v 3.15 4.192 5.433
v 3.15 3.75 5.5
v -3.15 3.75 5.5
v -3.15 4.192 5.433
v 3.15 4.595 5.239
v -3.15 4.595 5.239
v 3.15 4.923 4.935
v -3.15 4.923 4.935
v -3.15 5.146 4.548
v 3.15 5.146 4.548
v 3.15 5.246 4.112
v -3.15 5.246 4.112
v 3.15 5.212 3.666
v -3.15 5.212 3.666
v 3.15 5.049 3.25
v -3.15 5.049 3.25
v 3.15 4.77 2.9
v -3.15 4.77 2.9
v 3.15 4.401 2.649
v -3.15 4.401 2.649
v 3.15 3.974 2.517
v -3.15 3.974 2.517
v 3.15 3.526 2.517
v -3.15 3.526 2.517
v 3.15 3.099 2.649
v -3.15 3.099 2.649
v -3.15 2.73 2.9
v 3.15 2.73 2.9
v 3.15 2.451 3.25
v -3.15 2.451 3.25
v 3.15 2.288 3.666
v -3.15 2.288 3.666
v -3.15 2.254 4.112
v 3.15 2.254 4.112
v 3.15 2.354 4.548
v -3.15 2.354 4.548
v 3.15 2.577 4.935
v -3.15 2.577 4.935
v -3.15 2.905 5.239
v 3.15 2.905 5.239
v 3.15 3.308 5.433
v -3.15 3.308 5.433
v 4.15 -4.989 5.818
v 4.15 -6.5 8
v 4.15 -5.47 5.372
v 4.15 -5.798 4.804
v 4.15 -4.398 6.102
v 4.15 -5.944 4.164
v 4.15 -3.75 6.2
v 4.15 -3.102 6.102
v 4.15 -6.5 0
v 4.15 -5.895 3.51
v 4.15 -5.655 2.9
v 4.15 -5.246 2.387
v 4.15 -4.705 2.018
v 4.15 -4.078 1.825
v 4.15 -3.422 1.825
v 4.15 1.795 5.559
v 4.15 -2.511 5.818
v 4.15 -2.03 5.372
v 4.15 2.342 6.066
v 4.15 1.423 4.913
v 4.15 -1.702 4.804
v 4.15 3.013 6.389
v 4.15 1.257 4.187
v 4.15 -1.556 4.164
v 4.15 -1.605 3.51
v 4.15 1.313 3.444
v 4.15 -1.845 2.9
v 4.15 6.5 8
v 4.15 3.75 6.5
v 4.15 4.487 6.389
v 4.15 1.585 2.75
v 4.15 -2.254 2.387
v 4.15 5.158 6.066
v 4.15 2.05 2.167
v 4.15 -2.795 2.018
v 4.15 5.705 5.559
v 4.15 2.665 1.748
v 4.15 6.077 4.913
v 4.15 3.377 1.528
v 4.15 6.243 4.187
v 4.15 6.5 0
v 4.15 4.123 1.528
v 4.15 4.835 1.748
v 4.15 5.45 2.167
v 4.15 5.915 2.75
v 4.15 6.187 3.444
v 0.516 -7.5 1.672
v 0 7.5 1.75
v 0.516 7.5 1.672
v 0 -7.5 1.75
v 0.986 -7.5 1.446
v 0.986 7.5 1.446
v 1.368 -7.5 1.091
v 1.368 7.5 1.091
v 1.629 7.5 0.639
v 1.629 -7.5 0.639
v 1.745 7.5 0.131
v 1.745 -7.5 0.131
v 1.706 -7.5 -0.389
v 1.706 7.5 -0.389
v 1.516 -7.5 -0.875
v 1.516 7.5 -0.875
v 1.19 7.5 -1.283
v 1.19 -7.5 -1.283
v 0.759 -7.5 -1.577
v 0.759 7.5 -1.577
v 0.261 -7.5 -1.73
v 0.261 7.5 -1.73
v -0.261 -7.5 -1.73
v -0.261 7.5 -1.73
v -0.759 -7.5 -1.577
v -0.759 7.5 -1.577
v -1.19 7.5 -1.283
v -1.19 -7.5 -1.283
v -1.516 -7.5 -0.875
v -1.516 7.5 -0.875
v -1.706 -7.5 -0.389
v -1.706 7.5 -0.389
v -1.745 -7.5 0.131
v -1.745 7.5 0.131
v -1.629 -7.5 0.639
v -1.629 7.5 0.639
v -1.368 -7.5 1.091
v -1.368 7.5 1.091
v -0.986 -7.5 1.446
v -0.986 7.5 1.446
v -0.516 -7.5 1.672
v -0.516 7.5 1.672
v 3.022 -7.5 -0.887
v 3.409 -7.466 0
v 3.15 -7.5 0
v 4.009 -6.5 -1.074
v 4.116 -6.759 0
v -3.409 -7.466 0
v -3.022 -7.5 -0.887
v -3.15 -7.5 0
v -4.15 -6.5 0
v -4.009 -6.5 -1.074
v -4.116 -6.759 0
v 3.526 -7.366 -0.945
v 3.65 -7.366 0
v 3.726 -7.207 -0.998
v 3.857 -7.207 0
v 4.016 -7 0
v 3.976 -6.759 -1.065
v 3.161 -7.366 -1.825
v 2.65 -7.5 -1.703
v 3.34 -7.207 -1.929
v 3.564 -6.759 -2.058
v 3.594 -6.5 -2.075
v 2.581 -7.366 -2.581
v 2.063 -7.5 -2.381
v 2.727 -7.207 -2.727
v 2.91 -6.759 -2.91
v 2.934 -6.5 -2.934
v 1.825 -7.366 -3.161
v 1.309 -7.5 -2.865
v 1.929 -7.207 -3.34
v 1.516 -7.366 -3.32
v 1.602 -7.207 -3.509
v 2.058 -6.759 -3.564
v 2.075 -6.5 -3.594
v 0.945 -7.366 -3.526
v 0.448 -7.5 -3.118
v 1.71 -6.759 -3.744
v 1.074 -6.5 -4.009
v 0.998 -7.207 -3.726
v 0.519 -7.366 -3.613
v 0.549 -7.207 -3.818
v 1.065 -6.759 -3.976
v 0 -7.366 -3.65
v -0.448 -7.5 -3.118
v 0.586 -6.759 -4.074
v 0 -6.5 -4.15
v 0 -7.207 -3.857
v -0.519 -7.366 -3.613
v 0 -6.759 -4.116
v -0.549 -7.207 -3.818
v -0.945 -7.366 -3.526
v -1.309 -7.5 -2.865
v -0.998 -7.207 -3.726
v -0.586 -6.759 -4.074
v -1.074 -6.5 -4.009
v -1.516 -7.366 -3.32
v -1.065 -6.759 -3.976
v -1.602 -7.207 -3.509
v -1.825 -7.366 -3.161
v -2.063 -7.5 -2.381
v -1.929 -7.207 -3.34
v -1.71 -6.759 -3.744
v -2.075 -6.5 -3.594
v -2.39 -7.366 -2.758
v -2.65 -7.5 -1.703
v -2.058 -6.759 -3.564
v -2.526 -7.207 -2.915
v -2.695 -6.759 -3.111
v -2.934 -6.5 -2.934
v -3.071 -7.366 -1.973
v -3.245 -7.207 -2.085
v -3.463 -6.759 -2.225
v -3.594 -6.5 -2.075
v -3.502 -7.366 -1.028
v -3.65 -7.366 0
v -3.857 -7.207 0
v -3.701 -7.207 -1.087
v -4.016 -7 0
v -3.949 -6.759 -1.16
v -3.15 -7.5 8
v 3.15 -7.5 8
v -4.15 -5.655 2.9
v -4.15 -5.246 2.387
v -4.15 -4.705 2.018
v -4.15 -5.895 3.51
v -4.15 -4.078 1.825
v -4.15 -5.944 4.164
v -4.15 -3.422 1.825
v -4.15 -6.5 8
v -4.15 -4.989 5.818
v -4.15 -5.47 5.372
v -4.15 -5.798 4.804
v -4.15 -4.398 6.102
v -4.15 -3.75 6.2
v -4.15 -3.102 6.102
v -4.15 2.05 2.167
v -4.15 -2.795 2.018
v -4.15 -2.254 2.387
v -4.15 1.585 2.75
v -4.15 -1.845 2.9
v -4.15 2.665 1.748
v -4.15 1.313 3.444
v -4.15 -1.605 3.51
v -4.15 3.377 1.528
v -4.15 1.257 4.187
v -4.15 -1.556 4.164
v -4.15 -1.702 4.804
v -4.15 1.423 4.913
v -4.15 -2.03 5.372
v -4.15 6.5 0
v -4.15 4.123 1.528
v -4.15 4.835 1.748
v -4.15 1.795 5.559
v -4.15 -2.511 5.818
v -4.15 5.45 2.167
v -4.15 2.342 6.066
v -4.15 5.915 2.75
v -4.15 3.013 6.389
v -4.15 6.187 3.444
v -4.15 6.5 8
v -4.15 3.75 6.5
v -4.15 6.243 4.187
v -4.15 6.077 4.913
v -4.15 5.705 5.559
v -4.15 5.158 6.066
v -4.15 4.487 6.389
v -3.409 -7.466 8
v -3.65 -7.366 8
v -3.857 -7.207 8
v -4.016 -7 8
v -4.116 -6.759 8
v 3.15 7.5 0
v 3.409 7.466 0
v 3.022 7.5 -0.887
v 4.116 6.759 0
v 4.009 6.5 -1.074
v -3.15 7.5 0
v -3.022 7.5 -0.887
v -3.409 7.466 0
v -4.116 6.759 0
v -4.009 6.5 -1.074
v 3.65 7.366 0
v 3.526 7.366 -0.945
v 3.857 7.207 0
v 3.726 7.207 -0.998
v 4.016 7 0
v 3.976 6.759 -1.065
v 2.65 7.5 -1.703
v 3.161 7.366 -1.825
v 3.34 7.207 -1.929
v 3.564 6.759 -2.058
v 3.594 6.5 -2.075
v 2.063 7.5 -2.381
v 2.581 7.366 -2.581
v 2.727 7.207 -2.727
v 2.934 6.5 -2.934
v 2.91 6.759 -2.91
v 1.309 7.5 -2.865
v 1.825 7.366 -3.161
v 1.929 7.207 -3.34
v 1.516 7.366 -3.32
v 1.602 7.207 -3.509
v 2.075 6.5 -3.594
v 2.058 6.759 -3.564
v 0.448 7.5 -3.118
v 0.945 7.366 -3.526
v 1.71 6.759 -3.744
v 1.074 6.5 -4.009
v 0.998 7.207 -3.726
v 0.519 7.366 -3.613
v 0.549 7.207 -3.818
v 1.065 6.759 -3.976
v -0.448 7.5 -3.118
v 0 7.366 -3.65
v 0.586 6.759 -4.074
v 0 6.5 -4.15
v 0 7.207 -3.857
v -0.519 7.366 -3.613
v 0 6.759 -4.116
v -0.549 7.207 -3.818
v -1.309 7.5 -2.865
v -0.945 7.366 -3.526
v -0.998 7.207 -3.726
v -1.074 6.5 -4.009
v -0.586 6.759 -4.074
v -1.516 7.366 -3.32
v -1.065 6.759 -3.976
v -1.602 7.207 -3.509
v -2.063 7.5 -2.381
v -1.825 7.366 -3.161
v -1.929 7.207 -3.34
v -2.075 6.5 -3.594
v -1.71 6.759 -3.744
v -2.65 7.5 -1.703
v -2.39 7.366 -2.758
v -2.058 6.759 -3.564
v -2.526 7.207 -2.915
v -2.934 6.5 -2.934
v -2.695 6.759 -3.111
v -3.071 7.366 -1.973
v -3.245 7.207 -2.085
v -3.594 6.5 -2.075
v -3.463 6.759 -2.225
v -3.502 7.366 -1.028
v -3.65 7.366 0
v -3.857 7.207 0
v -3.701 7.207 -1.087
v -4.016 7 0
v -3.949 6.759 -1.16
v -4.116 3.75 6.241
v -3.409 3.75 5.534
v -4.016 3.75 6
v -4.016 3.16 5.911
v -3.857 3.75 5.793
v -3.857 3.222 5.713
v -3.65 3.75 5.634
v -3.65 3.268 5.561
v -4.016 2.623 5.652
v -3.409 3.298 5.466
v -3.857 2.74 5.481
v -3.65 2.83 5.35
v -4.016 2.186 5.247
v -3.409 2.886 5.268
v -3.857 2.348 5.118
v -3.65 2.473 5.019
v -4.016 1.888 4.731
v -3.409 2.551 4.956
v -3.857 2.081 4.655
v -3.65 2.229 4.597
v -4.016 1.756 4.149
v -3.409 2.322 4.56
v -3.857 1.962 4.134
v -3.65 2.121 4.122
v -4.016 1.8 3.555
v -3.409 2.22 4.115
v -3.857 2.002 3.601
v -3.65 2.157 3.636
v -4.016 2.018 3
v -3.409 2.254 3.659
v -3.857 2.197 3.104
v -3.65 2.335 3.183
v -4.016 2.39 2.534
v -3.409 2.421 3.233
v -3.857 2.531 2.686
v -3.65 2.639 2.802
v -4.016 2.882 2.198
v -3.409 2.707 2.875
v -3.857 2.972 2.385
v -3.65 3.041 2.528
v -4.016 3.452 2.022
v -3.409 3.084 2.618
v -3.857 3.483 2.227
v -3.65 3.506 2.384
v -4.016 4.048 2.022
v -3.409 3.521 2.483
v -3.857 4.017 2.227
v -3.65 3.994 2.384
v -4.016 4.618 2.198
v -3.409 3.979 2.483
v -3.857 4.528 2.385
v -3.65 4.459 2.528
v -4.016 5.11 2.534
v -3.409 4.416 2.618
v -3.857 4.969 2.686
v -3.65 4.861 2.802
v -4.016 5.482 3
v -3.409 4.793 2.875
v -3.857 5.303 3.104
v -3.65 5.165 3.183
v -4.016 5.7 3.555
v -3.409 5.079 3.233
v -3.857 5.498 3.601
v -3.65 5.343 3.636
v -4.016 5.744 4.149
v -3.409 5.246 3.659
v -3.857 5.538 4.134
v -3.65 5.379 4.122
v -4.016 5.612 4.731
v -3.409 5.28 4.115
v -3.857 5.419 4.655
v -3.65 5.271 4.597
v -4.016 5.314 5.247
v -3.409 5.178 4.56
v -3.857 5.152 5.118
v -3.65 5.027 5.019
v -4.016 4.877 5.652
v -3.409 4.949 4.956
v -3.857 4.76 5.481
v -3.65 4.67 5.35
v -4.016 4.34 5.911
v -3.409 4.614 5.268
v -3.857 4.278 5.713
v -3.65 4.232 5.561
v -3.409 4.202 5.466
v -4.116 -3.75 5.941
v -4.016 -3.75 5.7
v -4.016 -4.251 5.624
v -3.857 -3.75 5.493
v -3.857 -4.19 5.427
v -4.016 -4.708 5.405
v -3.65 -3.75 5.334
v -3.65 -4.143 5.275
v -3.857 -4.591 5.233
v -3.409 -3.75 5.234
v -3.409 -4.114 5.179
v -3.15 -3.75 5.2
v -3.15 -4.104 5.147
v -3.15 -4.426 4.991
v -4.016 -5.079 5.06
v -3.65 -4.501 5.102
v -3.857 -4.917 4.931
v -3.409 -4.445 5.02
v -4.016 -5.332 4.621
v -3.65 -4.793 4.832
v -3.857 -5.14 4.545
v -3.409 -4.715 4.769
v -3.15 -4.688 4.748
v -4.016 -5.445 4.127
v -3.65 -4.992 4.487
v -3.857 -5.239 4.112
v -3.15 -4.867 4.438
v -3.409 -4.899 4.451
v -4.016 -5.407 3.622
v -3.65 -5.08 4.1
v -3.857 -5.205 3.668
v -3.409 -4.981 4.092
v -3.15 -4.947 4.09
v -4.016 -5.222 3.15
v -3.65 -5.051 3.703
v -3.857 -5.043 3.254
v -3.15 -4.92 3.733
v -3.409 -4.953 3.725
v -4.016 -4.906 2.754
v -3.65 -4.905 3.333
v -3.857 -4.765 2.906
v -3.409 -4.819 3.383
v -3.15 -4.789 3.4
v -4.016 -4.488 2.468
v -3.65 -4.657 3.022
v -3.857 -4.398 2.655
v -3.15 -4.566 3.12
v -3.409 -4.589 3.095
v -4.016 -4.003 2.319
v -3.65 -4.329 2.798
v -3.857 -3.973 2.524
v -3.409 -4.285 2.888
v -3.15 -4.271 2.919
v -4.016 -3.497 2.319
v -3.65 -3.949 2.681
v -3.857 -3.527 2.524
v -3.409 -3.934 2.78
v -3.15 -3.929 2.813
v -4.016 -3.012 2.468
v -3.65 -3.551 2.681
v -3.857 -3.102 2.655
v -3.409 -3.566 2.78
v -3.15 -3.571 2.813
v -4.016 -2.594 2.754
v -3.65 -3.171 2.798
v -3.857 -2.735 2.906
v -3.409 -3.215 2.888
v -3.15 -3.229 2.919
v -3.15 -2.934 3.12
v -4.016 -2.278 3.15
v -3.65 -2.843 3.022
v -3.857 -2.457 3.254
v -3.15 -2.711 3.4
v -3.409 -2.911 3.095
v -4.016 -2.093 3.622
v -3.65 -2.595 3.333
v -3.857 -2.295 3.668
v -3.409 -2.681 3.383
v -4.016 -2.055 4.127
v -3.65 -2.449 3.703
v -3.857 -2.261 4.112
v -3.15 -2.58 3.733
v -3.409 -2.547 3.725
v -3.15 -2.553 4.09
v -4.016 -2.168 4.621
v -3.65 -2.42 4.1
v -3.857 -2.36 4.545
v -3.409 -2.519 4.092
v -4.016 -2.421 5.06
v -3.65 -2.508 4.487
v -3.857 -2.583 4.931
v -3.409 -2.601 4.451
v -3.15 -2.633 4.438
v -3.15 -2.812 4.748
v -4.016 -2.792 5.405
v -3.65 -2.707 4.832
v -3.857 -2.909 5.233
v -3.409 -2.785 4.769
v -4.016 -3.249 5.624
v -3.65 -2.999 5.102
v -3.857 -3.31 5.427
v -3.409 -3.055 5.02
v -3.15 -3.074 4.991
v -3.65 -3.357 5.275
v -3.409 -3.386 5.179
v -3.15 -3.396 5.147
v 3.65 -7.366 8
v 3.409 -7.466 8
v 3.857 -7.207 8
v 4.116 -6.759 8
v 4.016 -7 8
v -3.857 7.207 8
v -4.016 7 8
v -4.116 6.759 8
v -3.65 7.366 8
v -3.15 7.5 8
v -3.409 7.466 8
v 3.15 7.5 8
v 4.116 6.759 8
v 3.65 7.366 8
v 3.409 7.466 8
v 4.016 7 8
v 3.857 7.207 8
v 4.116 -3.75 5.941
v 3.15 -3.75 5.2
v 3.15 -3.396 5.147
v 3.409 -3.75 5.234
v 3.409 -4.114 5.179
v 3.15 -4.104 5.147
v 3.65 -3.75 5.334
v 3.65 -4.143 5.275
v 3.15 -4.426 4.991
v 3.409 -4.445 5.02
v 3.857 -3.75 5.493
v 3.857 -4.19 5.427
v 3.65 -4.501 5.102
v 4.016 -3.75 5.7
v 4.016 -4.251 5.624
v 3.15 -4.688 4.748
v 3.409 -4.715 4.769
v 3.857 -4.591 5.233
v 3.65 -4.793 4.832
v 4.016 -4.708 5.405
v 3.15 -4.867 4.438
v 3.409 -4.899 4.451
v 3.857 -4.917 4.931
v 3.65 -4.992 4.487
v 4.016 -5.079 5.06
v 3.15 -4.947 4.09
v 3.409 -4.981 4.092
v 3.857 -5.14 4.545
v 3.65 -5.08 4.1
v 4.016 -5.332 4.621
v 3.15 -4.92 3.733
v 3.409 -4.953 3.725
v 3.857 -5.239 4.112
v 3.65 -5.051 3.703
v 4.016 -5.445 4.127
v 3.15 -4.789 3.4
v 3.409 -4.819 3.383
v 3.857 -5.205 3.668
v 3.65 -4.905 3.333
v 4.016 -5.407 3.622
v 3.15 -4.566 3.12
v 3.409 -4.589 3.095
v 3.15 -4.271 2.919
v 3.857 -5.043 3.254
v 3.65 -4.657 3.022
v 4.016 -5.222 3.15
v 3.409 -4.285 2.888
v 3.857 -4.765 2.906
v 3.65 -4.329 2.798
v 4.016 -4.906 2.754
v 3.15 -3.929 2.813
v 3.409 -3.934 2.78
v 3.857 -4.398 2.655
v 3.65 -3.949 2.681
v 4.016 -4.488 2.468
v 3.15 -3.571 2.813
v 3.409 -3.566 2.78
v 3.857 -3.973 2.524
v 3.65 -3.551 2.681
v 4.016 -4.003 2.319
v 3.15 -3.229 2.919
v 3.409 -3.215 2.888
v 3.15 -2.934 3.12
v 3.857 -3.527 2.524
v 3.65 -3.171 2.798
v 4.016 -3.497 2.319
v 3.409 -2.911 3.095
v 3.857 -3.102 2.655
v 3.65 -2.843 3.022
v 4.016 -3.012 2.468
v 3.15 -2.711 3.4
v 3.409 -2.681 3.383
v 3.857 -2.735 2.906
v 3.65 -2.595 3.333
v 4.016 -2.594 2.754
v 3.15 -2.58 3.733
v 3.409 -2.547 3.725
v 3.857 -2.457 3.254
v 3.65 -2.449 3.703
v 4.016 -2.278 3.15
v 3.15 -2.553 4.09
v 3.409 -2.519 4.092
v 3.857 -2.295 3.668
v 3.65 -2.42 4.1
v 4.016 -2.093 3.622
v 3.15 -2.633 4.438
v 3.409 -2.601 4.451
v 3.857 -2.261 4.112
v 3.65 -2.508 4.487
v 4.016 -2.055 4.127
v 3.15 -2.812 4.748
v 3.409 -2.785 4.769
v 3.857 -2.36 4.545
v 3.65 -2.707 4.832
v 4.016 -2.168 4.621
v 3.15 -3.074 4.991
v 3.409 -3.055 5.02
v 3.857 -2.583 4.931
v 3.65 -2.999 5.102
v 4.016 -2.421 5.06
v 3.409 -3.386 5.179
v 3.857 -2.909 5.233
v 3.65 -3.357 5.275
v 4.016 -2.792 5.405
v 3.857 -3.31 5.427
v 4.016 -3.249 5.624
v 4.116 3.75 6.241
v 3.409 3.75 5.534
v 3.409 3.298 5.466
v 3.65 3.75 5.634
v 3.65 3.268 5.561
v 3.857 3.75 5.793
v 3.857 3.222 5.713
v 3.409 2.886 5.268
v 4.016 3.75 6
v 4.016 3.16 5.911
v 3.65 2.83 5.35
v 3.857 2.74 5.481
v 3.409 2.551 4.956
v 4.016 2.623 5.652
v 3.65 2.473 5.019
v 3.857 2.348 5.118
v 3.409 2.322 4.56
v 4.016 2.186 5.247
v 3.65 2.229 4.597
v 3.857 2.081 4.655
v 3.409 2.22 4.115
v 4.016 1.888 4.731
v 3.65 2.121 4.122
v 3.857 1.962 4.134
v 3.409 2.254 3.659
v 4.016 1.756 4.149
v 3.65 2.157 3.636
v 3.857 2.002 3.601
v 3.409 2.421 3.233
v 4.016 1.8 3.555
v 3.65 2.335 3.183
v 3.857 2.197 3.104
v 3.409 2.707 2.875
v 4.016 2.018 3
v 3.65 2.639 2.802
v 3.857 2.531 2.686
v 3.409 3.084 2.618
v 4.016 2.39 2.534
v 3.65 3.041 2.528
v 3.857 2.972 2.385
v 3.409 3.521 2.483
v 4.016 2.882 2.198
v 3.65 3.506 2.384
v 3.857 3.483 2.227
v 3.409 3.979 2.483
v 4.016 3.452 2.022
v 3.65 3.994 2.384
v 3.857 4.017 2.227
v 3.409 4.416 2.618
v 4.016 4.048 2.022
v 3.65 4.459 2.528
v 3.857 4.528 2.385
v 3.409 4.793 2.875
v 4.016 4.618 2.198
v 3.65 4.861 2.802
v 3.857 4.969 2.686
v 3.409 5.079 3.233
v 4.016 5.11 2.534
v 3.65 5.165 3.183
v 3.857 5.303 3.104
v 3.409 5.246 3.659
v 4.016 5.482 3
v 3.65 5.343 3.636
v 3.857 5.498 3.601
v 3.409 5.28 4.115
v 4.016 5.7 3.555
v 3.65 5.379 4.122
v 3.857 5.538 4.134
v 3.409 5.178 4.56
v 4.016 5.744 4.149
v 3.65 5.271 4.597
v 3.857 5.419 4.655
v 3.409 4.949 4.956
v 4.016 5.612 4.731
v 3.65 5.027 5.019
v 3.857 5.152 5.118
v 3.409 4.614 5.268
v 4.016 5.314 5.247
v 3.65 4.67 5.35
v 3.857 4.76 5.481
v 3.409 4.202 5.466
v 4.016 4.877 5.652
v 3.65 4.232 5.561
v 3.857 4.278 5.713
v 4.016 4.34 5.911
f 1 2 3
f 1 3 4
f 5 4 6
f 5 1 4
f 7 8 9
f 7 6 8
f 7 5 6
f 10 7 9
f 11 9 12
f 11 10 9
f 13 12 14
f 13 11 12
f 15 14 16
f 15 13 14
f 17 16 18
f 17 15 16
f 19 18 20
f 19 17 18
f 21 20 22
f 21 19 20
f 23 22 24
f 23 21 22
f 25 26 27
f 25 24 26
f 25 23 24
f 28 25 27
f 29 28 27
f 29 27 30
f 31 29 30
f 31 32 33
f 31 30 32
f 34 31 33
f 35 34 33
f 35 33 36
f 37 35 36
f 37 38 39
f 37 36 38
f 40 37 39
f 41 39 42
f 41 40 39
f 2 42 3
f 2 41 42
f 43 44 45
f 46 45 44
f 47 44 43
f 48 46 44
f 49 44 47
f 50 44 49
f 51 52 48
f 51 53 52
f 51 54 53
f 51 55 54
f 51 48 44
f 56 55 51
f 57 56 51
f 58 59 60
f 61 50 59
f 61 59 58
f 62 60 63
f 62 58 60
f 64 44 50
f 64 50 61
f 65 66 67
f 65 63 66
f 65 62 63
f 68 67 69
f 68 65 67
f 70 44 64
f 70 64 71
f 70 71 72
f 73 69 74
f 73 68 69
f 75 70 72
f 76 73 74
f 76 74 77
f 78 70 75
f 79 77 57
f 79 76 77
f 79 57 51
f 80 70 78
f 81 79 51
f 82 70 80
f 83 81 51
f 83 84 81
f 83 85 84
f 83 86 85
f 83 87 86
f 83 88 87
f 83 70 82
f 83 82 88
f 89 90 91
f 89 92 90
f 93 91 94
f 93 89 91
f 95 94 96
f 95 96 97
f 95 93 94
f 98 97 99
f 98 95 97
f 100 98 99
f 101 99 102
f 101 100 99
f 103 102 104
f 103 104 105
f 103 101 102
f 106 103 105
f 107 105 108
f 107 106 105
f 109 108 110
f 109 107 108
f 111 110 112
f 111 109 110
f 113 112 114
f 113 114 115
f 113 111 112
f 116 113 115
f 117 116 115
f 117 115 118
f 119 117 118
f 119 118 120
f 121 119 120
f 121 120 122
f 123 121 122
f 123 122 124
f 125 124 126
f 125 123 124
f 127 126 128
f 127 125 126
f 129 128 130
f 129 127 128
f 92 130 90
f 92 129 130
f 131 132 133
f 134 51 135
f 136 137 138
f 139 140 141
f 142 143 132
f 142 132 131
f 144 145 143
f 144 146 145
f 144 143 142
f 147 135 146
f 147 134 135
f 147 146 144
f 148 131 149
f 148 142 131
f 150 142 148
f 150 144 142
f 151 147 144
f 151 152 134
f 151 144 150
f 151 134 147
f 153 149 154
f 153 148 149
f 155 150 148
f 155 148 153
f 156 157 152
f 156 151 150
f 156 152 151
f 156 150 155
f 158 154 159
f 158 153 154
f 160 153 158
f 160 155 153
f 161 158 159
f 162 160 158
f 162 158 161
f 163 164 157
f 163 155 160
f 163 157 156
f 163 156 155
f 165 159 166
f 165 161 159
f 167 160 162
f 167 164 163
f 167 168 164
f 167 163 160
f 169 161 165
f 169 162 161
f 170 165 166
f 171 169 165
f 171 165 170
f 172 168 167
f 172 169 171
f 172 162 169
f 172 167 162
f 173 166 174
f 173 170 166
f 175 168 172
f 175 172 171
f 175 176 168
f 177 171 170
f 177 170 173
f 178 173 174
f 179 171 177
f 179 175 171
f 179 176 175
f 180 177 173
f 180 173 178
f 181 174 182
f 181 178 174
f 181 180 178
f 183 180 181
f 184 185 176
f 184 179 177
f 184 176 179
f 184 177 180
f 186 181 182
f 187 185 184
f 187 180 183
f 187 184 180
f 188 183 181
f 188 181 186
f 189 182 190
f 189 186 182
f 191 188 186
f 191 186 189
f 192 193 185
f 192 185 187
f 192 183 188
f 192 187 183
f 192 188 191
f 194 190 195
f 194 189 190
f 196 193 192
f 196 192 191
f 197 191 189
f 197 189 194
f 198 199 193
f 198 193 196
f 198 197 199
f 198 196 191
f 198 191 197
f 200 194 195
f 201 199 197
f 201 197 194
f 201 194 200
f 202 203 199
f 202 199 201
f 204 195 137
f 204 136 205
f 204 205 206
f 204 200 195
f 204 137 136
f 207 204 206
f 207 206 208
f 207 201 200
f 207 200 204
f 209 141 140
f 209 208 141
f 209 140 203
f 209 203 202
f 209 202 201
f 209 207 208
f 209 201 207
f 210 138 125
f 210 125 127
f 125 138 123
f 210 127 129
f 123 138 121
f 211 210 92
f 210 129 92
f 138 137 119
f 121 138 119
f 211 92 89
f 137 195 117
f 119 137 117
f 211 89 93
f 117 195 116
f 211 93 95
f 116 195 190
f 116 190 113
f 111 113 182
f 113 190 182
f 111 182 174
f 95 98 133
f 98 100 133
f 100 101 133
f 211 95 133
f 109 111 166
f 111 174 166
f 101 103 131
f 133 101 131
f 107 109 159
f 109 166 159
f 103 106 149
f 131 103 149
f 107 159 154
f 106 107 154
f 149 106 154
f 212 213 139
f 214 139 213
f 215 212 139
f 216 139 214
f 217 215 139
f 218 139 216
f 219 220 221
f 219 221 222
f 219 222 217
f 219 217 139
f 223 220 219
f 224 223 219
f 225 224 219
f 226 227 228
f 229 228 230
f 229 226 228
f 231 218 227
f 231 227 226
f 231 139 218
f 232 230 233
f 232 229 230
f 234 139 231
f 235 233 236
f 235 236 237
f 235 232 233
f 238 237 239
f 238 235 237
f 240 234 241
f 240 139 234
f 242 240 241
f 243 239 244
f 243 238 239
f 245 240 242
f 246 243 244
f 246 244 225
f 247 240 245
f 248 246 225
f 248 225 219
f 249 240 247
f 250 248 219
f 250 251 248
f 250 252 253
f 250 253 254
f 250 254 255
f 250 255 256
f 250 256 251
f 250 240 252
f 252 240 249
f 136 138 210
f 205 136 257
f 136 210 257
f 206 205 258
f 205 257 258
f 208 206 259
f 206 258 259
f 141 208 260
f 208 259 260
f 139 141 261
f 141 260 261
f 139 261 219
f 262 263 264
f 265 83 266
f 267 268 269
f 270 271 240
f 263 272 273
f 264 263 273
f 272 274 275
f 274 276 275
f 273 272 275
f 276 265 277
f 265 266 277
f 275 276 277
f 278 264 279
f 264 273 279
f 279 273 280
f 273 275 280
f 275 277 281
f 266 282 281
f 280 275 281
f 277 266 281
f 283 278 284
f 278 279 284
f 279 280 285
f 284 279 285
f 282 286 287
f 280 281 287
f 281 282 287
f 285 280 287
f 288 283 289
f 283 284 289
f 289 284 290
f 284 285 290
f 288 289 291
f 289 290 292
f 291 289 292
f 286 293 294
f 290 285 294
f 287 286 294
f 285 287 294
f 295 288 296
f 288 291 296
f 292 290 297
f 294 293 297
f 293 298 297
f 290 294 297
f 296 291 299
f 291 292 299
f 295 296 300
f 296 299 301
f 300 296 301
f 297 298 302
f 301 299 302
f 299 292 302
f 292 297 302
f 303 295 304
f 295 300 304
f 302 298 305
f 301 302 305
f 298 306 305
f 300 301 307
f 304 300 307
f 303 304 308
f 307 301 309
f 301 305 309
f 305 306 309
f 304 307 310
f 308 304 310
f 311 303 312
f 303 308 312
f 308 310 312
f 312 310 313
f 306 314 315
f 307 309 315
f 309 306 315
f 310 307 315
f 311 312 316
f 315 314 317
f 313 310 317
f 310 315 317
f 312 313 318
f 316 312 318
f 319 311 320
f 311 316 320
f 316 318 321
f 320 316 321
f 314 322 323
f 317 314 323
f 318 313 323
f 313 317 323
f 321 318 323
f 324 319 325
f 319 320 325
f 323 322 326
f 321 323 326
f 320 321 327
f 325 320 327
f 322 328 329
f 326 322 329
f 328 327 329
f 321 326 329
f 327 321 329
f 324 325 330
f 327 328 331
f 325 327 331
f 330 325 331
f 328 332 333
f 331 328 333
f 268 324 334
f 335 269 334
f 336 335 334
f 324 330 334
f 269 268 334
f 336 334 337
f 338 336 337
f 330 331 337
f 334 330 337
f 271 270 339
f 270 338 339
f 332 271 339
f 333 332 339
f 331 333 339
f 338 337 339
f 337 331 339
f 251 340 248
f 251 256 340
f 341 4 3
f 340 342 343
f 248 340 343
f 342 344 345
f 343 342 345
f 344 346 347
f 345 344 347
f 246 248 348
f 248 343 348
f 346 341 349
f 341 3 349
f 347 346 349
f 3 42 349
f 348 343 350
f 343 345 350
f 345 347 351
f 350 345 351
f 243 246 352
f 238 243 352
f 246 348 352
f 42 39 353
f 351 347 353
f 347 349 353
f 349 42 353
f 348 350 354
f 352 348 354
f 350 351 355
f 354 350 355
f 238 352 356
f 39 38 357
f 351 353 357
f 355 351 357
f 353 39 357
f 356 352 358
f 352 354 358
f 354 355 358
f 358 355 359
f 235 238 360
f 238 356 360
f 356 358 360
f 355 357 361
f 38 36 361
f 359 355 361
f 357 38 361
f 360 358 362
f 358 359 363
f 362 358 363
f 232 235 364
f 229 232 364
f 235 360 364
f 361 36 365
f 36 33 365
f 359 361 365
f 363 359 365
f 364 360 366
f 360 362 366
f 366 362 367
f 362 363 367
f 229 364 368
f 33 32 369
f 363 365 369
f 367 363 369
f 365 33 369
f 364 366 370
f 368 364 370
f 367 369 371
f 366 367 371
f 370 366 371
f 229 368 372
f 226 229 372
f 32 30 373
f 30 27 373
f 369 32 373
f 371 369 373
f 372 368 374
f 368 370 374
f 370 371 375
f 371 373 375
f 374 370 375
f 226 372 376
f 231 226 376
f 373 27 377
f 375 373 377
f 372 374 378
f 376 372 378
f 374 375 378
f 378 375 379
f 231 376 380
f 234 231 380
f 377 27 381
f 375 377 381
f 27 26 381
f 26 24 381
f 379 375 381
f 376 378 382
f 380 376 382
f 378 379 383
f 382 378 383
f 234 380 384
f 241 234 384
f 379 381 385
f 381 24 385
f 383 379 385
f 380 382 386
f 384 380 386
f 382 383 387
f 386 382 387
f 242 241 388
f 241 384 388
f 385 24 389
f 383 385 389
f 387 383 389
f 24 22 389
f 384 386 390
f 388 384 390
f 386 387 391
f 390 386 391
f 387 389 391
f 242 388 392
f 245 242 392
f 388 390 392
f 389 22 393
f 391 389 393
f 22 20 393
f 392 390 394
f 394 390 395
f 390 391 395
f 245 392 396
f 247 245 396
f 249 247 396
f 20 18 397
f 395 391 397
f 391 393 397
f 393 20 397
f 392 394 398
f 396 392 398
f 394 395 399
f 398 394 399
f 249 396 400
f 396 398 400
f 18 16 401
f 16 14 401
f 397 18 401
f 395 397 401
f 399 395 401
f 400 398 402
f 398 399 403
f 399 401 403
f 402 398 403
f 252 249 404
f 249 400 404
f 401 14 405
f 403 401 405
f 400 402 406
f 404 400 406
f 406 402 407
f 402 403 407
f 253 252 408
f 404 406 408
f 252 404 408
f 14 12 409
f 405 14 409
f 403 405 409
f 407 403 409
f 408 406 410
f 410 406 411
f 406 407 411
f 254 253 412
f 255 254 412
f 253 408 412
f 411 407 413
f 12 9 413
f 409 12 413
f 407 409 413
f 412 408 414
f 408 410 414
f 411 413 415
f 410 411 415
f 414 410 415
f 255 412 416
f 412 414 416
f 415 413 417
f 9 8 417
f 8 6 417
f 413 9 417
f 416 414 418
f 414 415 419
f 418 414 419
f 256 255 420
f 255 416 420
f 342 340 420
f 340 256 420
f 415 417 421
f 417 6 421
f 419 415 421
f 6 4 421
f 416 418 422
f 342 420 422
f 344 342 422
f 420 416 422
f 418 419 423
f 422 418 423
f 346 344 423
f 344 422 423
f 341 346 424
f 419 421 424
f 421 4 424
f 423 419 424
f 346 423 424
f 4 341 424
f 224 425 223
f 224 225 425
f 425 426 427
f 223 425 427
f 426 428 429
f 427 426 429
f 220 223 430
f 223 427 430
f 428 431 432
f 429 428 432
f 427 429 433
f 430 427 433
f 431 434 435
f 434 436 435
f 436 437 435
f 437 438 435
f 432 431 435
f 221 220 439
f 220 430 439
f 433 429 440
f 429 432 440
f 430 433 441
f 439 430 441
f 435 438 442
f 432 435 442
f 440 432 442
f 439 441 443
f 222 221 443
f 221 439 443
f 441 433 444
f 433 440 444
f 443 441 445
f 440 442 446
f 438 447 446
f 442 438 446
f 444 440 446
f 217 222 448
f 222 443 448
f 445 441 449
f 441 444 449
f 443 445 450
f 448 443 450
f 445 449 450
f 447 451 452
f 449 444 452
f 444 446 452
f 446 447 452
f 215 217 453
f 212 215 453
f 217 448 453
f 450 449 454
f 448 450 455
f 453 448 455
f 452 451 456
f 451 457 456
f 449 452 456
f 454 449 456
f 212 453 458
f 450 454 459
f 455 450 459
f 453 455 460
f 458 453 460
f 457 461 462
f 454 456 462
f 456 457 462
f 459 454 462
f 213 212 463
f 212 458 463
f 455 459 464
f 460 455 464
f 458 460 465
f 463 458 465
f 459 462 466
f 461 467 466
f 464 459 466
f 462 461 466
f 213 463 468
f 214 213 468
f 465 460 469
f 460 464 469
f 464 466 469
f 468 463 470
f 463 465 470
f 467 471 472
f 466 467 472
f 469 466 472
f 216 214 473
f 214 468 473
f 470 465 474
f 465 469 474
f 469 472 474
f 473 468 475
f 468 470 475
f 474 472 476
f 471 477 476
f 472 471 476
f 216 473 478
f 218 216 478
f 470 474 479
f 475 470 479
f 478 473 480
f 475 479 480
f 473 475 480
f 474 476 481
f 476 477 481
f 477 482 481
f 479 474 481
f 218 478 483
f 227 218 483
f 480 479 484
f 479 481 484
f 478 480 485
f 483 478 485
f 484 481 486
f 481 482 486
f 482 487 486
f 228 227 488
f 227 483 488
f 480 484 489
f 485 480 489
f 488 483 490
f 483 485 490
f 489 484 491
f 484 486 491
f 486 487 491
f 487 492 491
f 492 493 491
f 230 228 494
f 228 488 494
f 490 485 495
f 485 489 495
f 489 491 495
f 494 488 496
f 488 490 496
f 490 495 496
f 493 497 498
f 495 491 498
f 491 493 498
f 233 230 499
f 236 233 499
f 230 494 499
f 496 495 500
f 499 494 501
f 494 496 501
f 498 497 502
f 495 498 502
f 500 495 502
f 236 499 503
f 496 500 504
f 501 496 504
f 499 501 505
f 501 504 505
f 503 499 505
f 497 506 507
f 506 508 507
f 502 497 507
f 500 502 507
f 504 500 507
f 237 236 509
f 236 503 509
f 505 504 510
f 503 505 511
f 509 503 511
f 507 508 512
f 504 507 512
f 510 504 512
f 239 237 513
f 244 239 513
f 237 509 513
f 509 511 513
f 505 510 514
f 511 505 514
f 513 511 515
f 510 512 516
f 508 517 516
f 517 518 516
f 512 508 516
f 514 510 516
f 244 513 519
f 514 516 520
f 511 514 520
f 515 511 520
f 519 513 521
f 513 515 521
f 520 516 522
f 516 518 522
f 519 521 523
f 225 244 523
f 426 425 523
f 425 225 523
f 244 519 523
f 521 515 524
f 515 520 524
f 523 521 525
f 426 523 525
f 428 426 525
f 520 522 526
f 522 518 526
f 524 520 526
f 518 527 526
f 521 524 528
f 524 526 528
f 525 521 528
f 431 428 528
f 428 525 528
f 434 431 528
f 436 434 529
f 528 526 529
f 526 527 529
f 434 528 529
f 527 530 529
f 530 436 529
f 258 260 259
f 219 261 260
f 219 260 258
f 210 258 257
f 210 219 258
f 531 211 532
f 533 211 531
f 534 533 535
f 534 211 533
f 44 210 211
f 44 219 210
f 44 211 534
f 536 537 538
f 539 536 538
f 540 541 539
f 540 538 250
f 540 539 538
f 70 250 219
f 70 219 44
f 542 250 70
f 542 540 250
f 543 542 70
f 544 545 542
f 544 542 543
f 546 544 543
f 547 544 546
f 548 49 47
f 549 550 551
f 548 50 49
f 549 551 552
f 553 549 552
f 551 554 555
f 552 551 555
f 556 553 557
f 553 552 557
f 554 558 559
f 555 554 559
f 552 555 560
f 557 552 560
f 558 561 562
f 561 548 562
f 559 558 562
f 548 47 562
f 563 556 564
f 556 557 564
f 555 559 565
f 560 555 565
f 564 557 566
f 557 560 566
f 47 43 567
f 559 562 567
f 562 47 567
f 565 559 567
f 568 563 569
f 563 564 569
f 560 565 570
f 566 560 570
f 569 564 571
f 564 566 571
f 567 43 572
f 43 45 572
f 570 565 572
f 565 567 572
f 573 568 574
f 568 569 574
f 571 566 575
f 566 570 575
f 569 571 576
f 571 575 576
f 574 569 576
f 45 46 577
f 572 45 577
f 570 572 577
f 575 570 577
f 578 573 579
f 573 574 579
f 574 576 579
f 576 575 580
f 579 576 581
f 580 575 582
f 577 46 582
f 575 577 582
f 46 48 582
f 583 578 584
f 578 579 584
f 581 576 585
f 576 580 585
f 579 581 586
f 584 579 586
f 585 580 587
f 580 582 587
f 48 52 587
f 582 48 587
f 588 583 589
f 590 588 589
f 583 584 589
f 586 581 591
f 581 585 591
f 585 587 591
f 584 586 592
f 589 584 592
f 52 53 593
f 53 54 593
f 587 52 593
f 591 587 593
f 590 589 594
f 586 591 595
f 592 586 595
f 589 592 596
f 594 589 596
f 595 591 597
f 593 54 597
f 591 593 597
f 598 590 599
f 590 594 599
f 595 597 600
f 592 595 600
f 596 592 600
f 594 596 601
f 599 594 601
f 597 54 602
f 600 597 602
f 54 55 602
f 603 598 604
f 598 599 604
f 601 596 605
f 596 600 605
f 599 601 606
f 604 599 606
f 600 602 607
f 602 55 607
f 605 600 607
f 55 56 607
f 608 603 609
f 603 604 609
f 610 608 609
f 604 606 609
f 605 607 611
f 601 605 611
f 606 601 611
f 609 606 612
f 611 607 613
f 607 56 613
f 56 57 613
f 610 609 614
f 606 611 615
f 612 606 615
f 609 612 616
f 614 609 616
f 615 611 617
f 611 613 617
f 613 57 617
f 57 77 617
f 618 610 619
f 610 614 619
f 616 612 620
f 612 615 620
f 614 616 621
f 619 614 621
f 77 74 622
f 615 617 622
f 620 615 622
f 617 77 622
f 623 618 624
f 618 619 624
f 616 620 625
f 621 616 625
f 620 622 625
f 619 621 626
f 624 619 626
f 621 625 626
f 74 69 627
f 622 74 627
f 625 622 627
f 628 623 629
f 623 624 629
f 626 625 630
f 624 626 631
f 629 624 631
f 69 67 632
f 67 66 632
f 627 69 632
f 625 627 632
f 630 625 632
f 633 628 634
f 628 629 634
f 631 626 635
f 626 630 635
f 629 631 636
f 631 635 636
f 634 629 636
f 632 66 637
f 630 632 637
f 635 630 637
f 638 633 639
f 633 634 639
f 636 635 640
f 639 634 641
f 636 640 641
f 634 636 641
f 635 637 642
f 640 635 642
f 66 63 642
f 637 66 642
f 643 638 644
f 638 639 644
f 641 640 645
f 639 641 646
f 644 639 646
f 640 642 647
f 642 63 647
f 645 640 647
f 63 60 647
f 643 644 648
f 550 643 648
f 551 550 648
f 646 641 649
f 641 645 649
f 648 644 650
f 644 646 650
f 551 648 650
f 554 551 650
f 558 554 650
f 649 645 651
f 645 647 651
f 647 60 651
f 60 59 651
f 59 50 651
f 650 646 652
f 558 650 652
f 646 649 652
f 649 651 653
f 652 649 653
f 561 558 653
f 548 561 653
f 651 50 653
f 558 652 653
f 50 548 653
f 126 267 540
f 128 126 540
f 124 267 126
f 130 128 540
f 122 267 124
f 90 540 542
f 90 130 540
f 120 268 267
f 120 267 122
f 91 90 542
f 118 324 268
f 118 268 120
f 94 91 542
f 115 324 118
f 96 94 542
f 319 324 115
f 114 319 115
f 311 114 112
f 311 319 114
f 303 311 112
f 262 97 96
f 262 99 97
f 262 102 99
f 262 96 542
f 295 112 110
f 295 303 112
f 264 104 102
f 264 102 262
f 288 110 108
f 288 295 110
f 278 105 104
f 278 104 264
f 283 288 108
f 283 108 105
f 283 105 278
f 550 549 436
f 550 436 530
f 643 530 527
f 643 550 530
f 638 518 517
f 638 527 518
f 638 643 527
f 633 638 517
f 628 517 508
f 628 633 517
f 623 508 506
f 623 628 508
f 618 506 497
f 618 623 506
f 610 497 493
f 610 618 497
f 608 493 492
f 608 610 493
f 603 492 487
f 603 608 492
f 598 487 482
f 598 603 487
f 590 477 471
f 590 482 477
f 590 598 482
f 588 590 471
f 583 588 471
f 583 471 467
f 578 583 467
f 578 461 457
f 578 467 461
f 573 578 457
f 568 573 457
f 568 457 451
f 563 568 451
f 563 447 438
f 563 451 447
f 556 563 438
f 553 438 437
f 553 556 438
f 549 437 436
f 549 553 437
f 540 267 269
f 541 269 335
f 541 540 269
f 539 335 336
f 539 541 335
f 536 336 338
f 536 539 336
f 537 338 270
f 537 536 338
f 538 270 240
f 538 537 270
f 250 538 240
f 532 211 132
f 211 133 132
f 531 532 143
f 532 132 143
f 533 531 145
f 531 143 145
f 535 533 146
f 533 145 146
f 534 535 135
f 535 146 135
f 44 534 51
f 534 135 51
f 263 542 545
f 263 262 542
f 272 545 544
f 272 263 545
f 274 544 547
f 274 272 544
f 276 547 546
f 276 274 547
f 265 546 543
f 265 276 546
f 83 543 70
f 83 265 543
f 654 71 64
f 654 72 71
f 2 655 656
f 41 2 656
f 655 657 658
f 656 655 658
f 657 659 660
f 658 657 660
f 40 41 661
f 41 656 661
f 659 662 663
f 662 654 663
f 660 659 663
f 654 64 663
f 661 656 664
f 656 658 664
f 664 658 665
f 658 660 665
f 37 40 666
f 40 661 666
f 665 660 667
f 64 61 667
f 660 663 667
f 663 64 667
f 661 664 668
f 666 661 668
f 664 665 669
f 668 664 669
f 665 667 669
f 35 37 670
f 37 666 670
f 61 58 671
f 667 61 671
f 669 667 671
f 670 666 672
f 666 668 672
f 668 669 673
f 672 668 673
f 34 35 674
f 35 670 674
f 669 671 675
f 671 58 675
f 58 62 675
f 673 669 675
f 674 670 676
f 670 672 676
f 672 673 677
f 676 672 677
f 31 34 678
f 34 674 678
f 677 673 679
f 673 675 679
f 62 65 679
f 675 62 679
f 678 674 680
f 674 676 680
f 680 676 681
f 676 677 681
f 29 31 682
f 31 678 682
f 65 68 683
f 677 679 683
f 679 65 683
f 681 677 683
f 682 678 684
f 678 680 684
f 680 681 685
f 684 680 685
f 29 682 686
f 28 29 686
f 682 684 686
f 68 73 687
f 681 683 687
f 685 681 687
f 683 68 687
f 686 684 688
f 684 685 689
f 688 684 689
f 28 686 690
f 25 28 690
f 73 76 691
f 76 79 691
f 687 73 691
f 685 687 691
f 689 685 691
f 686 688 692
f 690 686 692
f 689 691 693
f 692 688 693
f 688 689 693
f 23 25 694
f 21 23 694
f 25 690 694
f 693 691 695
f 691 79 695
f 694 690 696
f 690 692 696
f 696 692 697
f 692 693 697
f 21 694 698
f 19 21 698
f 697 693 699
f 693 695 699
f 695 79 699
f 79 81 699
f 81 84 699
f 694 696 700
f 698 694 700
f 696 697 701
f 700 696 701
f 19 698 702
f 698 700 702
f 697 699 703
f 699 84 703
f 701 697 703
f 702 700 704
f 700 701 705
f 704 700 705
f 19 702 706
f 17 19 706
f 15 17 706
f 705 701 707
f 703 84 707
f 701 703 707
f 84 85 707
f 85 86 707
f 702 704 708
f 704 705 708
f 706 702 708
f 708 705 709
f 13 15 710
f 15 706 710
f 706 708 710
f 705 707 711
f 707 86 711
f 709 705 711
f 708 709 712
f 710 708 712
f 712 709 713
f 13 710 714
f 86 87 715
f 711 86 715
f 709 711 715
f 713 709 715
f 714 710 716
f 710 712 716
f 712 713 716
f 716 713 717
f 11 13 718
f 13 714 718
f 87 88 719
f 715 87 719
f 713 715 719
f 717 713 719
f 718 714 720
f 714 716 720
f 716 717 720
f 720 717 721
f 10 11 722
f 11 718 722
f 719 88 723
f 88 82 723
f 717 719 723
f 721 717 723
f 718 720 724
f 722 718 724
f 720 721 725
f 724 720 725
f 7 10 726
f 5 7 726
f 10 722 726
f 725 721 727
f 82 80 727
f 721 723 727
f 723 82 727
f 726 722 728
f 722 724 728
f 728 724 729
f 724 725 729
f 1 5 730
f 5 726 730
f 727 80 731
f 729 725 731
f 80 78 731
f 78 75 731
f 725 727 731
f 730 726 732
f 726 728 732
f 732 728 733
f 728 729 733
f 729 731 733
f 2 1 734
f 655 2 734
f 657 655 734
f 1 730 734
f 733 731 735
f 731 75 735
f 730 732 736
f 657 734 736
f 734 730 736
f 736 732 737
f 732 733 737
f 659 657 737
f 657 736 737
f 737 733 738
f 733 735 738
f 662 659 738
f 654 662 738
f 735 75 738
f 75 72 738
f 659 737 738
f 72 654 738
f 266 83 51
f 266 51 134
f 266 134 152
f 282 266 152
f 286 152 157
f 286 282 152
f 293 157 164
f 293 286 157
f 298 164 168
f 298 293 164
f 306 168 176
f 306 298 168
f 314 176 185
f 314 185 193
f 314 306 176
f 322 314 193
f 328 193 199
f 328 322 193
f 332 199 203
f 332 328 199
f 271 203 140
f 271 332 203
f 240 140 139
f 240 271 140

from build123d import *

# Parameters (mm, degrees)
SKETCH2_R               = 1.75
BOSS_EXTRUDE1_DEPTH     = 7.5
CUT_EXTRUDE1_DEPTH      = 14.752817893
CUT_EXTRUDE1_DEPTH_BACK = 14.752817893
SKETCH3_R               = 1.2
SKETCH3_R_2             = 1.5
FILLET1_R               = 1
FILLET2_R               = 1


with BuildPart() as part:
    # Sketch2 → Boss-Extrude1 (new, symmetric)
    with BuildSketch(Plane(origin=(0, 0, 0), x_dir=(1, 0, 0), z_dir=(0, 1, 0))):
        with BuildLine():
            Line((-4.15, 0), (-4.15, -8))
            Line((-4.15, -8), (4.15, -8))
            Line((4.15, -8), (4.15, 0))
            ThreePointArc((4.15, 0), (0, 4.15), (-4.15, 0))
        make_face()
        with Locations(Location((0, 0, 0), (0, 0, 270))):
            Circle(SKETCH2_R, mode=Mode.SUBTRACT)
    extrude(amount=BOSS_EXTRUDE1_DEPTH, both=True)

    # Sketch3 → Cut-Extrude1 (cut, two sides: drawn at the far end of the back side and taken through both)
    with BuildSketch(Plane.ZY.offset(4.15).offset(-CUT_EXTRUDE1_DEPTH_BACK)):
        with Locations((4, -3.75)):
            Circle(SKETCH3_R)
        with Locations((4, 3.75)):
            Circle(SKETCH3_R_2)
    extrude(amount=CUT_EXTRUDE1_DEPTH + CUT_EXTRUDE1_DEPTH_BACK, mode=Mode.SUBTRACT)

    # Fillet1
    fillet1_edges = [part.edges().sort_by_distance(p)[0] for p in [
        (4.15, -3.75, 2.8),
        (-4.15, -3.75, 2.8),
        (4.15, 3.75, 2.5),
        (-4.15, 3.75, 2.5),
    ]]
    fillet(fillet1_edges, radius=FILLET1_R)

    # Fillet2
    fillet2_edges = [part.edges().sort_by_distance(p)[0] for p in [
        (4.15, 7.5, 4),
        (0, 7.5, -4.15),
        (4.15, -7.5, 4),
        (-4.15, -7.5, 4),
        (0, -7.5, -4.15),
        (-4.15, 7.5, 4),
    ]]
    fillet(fillet2_edges, radius=FILLET2_R)


solid = part.part
